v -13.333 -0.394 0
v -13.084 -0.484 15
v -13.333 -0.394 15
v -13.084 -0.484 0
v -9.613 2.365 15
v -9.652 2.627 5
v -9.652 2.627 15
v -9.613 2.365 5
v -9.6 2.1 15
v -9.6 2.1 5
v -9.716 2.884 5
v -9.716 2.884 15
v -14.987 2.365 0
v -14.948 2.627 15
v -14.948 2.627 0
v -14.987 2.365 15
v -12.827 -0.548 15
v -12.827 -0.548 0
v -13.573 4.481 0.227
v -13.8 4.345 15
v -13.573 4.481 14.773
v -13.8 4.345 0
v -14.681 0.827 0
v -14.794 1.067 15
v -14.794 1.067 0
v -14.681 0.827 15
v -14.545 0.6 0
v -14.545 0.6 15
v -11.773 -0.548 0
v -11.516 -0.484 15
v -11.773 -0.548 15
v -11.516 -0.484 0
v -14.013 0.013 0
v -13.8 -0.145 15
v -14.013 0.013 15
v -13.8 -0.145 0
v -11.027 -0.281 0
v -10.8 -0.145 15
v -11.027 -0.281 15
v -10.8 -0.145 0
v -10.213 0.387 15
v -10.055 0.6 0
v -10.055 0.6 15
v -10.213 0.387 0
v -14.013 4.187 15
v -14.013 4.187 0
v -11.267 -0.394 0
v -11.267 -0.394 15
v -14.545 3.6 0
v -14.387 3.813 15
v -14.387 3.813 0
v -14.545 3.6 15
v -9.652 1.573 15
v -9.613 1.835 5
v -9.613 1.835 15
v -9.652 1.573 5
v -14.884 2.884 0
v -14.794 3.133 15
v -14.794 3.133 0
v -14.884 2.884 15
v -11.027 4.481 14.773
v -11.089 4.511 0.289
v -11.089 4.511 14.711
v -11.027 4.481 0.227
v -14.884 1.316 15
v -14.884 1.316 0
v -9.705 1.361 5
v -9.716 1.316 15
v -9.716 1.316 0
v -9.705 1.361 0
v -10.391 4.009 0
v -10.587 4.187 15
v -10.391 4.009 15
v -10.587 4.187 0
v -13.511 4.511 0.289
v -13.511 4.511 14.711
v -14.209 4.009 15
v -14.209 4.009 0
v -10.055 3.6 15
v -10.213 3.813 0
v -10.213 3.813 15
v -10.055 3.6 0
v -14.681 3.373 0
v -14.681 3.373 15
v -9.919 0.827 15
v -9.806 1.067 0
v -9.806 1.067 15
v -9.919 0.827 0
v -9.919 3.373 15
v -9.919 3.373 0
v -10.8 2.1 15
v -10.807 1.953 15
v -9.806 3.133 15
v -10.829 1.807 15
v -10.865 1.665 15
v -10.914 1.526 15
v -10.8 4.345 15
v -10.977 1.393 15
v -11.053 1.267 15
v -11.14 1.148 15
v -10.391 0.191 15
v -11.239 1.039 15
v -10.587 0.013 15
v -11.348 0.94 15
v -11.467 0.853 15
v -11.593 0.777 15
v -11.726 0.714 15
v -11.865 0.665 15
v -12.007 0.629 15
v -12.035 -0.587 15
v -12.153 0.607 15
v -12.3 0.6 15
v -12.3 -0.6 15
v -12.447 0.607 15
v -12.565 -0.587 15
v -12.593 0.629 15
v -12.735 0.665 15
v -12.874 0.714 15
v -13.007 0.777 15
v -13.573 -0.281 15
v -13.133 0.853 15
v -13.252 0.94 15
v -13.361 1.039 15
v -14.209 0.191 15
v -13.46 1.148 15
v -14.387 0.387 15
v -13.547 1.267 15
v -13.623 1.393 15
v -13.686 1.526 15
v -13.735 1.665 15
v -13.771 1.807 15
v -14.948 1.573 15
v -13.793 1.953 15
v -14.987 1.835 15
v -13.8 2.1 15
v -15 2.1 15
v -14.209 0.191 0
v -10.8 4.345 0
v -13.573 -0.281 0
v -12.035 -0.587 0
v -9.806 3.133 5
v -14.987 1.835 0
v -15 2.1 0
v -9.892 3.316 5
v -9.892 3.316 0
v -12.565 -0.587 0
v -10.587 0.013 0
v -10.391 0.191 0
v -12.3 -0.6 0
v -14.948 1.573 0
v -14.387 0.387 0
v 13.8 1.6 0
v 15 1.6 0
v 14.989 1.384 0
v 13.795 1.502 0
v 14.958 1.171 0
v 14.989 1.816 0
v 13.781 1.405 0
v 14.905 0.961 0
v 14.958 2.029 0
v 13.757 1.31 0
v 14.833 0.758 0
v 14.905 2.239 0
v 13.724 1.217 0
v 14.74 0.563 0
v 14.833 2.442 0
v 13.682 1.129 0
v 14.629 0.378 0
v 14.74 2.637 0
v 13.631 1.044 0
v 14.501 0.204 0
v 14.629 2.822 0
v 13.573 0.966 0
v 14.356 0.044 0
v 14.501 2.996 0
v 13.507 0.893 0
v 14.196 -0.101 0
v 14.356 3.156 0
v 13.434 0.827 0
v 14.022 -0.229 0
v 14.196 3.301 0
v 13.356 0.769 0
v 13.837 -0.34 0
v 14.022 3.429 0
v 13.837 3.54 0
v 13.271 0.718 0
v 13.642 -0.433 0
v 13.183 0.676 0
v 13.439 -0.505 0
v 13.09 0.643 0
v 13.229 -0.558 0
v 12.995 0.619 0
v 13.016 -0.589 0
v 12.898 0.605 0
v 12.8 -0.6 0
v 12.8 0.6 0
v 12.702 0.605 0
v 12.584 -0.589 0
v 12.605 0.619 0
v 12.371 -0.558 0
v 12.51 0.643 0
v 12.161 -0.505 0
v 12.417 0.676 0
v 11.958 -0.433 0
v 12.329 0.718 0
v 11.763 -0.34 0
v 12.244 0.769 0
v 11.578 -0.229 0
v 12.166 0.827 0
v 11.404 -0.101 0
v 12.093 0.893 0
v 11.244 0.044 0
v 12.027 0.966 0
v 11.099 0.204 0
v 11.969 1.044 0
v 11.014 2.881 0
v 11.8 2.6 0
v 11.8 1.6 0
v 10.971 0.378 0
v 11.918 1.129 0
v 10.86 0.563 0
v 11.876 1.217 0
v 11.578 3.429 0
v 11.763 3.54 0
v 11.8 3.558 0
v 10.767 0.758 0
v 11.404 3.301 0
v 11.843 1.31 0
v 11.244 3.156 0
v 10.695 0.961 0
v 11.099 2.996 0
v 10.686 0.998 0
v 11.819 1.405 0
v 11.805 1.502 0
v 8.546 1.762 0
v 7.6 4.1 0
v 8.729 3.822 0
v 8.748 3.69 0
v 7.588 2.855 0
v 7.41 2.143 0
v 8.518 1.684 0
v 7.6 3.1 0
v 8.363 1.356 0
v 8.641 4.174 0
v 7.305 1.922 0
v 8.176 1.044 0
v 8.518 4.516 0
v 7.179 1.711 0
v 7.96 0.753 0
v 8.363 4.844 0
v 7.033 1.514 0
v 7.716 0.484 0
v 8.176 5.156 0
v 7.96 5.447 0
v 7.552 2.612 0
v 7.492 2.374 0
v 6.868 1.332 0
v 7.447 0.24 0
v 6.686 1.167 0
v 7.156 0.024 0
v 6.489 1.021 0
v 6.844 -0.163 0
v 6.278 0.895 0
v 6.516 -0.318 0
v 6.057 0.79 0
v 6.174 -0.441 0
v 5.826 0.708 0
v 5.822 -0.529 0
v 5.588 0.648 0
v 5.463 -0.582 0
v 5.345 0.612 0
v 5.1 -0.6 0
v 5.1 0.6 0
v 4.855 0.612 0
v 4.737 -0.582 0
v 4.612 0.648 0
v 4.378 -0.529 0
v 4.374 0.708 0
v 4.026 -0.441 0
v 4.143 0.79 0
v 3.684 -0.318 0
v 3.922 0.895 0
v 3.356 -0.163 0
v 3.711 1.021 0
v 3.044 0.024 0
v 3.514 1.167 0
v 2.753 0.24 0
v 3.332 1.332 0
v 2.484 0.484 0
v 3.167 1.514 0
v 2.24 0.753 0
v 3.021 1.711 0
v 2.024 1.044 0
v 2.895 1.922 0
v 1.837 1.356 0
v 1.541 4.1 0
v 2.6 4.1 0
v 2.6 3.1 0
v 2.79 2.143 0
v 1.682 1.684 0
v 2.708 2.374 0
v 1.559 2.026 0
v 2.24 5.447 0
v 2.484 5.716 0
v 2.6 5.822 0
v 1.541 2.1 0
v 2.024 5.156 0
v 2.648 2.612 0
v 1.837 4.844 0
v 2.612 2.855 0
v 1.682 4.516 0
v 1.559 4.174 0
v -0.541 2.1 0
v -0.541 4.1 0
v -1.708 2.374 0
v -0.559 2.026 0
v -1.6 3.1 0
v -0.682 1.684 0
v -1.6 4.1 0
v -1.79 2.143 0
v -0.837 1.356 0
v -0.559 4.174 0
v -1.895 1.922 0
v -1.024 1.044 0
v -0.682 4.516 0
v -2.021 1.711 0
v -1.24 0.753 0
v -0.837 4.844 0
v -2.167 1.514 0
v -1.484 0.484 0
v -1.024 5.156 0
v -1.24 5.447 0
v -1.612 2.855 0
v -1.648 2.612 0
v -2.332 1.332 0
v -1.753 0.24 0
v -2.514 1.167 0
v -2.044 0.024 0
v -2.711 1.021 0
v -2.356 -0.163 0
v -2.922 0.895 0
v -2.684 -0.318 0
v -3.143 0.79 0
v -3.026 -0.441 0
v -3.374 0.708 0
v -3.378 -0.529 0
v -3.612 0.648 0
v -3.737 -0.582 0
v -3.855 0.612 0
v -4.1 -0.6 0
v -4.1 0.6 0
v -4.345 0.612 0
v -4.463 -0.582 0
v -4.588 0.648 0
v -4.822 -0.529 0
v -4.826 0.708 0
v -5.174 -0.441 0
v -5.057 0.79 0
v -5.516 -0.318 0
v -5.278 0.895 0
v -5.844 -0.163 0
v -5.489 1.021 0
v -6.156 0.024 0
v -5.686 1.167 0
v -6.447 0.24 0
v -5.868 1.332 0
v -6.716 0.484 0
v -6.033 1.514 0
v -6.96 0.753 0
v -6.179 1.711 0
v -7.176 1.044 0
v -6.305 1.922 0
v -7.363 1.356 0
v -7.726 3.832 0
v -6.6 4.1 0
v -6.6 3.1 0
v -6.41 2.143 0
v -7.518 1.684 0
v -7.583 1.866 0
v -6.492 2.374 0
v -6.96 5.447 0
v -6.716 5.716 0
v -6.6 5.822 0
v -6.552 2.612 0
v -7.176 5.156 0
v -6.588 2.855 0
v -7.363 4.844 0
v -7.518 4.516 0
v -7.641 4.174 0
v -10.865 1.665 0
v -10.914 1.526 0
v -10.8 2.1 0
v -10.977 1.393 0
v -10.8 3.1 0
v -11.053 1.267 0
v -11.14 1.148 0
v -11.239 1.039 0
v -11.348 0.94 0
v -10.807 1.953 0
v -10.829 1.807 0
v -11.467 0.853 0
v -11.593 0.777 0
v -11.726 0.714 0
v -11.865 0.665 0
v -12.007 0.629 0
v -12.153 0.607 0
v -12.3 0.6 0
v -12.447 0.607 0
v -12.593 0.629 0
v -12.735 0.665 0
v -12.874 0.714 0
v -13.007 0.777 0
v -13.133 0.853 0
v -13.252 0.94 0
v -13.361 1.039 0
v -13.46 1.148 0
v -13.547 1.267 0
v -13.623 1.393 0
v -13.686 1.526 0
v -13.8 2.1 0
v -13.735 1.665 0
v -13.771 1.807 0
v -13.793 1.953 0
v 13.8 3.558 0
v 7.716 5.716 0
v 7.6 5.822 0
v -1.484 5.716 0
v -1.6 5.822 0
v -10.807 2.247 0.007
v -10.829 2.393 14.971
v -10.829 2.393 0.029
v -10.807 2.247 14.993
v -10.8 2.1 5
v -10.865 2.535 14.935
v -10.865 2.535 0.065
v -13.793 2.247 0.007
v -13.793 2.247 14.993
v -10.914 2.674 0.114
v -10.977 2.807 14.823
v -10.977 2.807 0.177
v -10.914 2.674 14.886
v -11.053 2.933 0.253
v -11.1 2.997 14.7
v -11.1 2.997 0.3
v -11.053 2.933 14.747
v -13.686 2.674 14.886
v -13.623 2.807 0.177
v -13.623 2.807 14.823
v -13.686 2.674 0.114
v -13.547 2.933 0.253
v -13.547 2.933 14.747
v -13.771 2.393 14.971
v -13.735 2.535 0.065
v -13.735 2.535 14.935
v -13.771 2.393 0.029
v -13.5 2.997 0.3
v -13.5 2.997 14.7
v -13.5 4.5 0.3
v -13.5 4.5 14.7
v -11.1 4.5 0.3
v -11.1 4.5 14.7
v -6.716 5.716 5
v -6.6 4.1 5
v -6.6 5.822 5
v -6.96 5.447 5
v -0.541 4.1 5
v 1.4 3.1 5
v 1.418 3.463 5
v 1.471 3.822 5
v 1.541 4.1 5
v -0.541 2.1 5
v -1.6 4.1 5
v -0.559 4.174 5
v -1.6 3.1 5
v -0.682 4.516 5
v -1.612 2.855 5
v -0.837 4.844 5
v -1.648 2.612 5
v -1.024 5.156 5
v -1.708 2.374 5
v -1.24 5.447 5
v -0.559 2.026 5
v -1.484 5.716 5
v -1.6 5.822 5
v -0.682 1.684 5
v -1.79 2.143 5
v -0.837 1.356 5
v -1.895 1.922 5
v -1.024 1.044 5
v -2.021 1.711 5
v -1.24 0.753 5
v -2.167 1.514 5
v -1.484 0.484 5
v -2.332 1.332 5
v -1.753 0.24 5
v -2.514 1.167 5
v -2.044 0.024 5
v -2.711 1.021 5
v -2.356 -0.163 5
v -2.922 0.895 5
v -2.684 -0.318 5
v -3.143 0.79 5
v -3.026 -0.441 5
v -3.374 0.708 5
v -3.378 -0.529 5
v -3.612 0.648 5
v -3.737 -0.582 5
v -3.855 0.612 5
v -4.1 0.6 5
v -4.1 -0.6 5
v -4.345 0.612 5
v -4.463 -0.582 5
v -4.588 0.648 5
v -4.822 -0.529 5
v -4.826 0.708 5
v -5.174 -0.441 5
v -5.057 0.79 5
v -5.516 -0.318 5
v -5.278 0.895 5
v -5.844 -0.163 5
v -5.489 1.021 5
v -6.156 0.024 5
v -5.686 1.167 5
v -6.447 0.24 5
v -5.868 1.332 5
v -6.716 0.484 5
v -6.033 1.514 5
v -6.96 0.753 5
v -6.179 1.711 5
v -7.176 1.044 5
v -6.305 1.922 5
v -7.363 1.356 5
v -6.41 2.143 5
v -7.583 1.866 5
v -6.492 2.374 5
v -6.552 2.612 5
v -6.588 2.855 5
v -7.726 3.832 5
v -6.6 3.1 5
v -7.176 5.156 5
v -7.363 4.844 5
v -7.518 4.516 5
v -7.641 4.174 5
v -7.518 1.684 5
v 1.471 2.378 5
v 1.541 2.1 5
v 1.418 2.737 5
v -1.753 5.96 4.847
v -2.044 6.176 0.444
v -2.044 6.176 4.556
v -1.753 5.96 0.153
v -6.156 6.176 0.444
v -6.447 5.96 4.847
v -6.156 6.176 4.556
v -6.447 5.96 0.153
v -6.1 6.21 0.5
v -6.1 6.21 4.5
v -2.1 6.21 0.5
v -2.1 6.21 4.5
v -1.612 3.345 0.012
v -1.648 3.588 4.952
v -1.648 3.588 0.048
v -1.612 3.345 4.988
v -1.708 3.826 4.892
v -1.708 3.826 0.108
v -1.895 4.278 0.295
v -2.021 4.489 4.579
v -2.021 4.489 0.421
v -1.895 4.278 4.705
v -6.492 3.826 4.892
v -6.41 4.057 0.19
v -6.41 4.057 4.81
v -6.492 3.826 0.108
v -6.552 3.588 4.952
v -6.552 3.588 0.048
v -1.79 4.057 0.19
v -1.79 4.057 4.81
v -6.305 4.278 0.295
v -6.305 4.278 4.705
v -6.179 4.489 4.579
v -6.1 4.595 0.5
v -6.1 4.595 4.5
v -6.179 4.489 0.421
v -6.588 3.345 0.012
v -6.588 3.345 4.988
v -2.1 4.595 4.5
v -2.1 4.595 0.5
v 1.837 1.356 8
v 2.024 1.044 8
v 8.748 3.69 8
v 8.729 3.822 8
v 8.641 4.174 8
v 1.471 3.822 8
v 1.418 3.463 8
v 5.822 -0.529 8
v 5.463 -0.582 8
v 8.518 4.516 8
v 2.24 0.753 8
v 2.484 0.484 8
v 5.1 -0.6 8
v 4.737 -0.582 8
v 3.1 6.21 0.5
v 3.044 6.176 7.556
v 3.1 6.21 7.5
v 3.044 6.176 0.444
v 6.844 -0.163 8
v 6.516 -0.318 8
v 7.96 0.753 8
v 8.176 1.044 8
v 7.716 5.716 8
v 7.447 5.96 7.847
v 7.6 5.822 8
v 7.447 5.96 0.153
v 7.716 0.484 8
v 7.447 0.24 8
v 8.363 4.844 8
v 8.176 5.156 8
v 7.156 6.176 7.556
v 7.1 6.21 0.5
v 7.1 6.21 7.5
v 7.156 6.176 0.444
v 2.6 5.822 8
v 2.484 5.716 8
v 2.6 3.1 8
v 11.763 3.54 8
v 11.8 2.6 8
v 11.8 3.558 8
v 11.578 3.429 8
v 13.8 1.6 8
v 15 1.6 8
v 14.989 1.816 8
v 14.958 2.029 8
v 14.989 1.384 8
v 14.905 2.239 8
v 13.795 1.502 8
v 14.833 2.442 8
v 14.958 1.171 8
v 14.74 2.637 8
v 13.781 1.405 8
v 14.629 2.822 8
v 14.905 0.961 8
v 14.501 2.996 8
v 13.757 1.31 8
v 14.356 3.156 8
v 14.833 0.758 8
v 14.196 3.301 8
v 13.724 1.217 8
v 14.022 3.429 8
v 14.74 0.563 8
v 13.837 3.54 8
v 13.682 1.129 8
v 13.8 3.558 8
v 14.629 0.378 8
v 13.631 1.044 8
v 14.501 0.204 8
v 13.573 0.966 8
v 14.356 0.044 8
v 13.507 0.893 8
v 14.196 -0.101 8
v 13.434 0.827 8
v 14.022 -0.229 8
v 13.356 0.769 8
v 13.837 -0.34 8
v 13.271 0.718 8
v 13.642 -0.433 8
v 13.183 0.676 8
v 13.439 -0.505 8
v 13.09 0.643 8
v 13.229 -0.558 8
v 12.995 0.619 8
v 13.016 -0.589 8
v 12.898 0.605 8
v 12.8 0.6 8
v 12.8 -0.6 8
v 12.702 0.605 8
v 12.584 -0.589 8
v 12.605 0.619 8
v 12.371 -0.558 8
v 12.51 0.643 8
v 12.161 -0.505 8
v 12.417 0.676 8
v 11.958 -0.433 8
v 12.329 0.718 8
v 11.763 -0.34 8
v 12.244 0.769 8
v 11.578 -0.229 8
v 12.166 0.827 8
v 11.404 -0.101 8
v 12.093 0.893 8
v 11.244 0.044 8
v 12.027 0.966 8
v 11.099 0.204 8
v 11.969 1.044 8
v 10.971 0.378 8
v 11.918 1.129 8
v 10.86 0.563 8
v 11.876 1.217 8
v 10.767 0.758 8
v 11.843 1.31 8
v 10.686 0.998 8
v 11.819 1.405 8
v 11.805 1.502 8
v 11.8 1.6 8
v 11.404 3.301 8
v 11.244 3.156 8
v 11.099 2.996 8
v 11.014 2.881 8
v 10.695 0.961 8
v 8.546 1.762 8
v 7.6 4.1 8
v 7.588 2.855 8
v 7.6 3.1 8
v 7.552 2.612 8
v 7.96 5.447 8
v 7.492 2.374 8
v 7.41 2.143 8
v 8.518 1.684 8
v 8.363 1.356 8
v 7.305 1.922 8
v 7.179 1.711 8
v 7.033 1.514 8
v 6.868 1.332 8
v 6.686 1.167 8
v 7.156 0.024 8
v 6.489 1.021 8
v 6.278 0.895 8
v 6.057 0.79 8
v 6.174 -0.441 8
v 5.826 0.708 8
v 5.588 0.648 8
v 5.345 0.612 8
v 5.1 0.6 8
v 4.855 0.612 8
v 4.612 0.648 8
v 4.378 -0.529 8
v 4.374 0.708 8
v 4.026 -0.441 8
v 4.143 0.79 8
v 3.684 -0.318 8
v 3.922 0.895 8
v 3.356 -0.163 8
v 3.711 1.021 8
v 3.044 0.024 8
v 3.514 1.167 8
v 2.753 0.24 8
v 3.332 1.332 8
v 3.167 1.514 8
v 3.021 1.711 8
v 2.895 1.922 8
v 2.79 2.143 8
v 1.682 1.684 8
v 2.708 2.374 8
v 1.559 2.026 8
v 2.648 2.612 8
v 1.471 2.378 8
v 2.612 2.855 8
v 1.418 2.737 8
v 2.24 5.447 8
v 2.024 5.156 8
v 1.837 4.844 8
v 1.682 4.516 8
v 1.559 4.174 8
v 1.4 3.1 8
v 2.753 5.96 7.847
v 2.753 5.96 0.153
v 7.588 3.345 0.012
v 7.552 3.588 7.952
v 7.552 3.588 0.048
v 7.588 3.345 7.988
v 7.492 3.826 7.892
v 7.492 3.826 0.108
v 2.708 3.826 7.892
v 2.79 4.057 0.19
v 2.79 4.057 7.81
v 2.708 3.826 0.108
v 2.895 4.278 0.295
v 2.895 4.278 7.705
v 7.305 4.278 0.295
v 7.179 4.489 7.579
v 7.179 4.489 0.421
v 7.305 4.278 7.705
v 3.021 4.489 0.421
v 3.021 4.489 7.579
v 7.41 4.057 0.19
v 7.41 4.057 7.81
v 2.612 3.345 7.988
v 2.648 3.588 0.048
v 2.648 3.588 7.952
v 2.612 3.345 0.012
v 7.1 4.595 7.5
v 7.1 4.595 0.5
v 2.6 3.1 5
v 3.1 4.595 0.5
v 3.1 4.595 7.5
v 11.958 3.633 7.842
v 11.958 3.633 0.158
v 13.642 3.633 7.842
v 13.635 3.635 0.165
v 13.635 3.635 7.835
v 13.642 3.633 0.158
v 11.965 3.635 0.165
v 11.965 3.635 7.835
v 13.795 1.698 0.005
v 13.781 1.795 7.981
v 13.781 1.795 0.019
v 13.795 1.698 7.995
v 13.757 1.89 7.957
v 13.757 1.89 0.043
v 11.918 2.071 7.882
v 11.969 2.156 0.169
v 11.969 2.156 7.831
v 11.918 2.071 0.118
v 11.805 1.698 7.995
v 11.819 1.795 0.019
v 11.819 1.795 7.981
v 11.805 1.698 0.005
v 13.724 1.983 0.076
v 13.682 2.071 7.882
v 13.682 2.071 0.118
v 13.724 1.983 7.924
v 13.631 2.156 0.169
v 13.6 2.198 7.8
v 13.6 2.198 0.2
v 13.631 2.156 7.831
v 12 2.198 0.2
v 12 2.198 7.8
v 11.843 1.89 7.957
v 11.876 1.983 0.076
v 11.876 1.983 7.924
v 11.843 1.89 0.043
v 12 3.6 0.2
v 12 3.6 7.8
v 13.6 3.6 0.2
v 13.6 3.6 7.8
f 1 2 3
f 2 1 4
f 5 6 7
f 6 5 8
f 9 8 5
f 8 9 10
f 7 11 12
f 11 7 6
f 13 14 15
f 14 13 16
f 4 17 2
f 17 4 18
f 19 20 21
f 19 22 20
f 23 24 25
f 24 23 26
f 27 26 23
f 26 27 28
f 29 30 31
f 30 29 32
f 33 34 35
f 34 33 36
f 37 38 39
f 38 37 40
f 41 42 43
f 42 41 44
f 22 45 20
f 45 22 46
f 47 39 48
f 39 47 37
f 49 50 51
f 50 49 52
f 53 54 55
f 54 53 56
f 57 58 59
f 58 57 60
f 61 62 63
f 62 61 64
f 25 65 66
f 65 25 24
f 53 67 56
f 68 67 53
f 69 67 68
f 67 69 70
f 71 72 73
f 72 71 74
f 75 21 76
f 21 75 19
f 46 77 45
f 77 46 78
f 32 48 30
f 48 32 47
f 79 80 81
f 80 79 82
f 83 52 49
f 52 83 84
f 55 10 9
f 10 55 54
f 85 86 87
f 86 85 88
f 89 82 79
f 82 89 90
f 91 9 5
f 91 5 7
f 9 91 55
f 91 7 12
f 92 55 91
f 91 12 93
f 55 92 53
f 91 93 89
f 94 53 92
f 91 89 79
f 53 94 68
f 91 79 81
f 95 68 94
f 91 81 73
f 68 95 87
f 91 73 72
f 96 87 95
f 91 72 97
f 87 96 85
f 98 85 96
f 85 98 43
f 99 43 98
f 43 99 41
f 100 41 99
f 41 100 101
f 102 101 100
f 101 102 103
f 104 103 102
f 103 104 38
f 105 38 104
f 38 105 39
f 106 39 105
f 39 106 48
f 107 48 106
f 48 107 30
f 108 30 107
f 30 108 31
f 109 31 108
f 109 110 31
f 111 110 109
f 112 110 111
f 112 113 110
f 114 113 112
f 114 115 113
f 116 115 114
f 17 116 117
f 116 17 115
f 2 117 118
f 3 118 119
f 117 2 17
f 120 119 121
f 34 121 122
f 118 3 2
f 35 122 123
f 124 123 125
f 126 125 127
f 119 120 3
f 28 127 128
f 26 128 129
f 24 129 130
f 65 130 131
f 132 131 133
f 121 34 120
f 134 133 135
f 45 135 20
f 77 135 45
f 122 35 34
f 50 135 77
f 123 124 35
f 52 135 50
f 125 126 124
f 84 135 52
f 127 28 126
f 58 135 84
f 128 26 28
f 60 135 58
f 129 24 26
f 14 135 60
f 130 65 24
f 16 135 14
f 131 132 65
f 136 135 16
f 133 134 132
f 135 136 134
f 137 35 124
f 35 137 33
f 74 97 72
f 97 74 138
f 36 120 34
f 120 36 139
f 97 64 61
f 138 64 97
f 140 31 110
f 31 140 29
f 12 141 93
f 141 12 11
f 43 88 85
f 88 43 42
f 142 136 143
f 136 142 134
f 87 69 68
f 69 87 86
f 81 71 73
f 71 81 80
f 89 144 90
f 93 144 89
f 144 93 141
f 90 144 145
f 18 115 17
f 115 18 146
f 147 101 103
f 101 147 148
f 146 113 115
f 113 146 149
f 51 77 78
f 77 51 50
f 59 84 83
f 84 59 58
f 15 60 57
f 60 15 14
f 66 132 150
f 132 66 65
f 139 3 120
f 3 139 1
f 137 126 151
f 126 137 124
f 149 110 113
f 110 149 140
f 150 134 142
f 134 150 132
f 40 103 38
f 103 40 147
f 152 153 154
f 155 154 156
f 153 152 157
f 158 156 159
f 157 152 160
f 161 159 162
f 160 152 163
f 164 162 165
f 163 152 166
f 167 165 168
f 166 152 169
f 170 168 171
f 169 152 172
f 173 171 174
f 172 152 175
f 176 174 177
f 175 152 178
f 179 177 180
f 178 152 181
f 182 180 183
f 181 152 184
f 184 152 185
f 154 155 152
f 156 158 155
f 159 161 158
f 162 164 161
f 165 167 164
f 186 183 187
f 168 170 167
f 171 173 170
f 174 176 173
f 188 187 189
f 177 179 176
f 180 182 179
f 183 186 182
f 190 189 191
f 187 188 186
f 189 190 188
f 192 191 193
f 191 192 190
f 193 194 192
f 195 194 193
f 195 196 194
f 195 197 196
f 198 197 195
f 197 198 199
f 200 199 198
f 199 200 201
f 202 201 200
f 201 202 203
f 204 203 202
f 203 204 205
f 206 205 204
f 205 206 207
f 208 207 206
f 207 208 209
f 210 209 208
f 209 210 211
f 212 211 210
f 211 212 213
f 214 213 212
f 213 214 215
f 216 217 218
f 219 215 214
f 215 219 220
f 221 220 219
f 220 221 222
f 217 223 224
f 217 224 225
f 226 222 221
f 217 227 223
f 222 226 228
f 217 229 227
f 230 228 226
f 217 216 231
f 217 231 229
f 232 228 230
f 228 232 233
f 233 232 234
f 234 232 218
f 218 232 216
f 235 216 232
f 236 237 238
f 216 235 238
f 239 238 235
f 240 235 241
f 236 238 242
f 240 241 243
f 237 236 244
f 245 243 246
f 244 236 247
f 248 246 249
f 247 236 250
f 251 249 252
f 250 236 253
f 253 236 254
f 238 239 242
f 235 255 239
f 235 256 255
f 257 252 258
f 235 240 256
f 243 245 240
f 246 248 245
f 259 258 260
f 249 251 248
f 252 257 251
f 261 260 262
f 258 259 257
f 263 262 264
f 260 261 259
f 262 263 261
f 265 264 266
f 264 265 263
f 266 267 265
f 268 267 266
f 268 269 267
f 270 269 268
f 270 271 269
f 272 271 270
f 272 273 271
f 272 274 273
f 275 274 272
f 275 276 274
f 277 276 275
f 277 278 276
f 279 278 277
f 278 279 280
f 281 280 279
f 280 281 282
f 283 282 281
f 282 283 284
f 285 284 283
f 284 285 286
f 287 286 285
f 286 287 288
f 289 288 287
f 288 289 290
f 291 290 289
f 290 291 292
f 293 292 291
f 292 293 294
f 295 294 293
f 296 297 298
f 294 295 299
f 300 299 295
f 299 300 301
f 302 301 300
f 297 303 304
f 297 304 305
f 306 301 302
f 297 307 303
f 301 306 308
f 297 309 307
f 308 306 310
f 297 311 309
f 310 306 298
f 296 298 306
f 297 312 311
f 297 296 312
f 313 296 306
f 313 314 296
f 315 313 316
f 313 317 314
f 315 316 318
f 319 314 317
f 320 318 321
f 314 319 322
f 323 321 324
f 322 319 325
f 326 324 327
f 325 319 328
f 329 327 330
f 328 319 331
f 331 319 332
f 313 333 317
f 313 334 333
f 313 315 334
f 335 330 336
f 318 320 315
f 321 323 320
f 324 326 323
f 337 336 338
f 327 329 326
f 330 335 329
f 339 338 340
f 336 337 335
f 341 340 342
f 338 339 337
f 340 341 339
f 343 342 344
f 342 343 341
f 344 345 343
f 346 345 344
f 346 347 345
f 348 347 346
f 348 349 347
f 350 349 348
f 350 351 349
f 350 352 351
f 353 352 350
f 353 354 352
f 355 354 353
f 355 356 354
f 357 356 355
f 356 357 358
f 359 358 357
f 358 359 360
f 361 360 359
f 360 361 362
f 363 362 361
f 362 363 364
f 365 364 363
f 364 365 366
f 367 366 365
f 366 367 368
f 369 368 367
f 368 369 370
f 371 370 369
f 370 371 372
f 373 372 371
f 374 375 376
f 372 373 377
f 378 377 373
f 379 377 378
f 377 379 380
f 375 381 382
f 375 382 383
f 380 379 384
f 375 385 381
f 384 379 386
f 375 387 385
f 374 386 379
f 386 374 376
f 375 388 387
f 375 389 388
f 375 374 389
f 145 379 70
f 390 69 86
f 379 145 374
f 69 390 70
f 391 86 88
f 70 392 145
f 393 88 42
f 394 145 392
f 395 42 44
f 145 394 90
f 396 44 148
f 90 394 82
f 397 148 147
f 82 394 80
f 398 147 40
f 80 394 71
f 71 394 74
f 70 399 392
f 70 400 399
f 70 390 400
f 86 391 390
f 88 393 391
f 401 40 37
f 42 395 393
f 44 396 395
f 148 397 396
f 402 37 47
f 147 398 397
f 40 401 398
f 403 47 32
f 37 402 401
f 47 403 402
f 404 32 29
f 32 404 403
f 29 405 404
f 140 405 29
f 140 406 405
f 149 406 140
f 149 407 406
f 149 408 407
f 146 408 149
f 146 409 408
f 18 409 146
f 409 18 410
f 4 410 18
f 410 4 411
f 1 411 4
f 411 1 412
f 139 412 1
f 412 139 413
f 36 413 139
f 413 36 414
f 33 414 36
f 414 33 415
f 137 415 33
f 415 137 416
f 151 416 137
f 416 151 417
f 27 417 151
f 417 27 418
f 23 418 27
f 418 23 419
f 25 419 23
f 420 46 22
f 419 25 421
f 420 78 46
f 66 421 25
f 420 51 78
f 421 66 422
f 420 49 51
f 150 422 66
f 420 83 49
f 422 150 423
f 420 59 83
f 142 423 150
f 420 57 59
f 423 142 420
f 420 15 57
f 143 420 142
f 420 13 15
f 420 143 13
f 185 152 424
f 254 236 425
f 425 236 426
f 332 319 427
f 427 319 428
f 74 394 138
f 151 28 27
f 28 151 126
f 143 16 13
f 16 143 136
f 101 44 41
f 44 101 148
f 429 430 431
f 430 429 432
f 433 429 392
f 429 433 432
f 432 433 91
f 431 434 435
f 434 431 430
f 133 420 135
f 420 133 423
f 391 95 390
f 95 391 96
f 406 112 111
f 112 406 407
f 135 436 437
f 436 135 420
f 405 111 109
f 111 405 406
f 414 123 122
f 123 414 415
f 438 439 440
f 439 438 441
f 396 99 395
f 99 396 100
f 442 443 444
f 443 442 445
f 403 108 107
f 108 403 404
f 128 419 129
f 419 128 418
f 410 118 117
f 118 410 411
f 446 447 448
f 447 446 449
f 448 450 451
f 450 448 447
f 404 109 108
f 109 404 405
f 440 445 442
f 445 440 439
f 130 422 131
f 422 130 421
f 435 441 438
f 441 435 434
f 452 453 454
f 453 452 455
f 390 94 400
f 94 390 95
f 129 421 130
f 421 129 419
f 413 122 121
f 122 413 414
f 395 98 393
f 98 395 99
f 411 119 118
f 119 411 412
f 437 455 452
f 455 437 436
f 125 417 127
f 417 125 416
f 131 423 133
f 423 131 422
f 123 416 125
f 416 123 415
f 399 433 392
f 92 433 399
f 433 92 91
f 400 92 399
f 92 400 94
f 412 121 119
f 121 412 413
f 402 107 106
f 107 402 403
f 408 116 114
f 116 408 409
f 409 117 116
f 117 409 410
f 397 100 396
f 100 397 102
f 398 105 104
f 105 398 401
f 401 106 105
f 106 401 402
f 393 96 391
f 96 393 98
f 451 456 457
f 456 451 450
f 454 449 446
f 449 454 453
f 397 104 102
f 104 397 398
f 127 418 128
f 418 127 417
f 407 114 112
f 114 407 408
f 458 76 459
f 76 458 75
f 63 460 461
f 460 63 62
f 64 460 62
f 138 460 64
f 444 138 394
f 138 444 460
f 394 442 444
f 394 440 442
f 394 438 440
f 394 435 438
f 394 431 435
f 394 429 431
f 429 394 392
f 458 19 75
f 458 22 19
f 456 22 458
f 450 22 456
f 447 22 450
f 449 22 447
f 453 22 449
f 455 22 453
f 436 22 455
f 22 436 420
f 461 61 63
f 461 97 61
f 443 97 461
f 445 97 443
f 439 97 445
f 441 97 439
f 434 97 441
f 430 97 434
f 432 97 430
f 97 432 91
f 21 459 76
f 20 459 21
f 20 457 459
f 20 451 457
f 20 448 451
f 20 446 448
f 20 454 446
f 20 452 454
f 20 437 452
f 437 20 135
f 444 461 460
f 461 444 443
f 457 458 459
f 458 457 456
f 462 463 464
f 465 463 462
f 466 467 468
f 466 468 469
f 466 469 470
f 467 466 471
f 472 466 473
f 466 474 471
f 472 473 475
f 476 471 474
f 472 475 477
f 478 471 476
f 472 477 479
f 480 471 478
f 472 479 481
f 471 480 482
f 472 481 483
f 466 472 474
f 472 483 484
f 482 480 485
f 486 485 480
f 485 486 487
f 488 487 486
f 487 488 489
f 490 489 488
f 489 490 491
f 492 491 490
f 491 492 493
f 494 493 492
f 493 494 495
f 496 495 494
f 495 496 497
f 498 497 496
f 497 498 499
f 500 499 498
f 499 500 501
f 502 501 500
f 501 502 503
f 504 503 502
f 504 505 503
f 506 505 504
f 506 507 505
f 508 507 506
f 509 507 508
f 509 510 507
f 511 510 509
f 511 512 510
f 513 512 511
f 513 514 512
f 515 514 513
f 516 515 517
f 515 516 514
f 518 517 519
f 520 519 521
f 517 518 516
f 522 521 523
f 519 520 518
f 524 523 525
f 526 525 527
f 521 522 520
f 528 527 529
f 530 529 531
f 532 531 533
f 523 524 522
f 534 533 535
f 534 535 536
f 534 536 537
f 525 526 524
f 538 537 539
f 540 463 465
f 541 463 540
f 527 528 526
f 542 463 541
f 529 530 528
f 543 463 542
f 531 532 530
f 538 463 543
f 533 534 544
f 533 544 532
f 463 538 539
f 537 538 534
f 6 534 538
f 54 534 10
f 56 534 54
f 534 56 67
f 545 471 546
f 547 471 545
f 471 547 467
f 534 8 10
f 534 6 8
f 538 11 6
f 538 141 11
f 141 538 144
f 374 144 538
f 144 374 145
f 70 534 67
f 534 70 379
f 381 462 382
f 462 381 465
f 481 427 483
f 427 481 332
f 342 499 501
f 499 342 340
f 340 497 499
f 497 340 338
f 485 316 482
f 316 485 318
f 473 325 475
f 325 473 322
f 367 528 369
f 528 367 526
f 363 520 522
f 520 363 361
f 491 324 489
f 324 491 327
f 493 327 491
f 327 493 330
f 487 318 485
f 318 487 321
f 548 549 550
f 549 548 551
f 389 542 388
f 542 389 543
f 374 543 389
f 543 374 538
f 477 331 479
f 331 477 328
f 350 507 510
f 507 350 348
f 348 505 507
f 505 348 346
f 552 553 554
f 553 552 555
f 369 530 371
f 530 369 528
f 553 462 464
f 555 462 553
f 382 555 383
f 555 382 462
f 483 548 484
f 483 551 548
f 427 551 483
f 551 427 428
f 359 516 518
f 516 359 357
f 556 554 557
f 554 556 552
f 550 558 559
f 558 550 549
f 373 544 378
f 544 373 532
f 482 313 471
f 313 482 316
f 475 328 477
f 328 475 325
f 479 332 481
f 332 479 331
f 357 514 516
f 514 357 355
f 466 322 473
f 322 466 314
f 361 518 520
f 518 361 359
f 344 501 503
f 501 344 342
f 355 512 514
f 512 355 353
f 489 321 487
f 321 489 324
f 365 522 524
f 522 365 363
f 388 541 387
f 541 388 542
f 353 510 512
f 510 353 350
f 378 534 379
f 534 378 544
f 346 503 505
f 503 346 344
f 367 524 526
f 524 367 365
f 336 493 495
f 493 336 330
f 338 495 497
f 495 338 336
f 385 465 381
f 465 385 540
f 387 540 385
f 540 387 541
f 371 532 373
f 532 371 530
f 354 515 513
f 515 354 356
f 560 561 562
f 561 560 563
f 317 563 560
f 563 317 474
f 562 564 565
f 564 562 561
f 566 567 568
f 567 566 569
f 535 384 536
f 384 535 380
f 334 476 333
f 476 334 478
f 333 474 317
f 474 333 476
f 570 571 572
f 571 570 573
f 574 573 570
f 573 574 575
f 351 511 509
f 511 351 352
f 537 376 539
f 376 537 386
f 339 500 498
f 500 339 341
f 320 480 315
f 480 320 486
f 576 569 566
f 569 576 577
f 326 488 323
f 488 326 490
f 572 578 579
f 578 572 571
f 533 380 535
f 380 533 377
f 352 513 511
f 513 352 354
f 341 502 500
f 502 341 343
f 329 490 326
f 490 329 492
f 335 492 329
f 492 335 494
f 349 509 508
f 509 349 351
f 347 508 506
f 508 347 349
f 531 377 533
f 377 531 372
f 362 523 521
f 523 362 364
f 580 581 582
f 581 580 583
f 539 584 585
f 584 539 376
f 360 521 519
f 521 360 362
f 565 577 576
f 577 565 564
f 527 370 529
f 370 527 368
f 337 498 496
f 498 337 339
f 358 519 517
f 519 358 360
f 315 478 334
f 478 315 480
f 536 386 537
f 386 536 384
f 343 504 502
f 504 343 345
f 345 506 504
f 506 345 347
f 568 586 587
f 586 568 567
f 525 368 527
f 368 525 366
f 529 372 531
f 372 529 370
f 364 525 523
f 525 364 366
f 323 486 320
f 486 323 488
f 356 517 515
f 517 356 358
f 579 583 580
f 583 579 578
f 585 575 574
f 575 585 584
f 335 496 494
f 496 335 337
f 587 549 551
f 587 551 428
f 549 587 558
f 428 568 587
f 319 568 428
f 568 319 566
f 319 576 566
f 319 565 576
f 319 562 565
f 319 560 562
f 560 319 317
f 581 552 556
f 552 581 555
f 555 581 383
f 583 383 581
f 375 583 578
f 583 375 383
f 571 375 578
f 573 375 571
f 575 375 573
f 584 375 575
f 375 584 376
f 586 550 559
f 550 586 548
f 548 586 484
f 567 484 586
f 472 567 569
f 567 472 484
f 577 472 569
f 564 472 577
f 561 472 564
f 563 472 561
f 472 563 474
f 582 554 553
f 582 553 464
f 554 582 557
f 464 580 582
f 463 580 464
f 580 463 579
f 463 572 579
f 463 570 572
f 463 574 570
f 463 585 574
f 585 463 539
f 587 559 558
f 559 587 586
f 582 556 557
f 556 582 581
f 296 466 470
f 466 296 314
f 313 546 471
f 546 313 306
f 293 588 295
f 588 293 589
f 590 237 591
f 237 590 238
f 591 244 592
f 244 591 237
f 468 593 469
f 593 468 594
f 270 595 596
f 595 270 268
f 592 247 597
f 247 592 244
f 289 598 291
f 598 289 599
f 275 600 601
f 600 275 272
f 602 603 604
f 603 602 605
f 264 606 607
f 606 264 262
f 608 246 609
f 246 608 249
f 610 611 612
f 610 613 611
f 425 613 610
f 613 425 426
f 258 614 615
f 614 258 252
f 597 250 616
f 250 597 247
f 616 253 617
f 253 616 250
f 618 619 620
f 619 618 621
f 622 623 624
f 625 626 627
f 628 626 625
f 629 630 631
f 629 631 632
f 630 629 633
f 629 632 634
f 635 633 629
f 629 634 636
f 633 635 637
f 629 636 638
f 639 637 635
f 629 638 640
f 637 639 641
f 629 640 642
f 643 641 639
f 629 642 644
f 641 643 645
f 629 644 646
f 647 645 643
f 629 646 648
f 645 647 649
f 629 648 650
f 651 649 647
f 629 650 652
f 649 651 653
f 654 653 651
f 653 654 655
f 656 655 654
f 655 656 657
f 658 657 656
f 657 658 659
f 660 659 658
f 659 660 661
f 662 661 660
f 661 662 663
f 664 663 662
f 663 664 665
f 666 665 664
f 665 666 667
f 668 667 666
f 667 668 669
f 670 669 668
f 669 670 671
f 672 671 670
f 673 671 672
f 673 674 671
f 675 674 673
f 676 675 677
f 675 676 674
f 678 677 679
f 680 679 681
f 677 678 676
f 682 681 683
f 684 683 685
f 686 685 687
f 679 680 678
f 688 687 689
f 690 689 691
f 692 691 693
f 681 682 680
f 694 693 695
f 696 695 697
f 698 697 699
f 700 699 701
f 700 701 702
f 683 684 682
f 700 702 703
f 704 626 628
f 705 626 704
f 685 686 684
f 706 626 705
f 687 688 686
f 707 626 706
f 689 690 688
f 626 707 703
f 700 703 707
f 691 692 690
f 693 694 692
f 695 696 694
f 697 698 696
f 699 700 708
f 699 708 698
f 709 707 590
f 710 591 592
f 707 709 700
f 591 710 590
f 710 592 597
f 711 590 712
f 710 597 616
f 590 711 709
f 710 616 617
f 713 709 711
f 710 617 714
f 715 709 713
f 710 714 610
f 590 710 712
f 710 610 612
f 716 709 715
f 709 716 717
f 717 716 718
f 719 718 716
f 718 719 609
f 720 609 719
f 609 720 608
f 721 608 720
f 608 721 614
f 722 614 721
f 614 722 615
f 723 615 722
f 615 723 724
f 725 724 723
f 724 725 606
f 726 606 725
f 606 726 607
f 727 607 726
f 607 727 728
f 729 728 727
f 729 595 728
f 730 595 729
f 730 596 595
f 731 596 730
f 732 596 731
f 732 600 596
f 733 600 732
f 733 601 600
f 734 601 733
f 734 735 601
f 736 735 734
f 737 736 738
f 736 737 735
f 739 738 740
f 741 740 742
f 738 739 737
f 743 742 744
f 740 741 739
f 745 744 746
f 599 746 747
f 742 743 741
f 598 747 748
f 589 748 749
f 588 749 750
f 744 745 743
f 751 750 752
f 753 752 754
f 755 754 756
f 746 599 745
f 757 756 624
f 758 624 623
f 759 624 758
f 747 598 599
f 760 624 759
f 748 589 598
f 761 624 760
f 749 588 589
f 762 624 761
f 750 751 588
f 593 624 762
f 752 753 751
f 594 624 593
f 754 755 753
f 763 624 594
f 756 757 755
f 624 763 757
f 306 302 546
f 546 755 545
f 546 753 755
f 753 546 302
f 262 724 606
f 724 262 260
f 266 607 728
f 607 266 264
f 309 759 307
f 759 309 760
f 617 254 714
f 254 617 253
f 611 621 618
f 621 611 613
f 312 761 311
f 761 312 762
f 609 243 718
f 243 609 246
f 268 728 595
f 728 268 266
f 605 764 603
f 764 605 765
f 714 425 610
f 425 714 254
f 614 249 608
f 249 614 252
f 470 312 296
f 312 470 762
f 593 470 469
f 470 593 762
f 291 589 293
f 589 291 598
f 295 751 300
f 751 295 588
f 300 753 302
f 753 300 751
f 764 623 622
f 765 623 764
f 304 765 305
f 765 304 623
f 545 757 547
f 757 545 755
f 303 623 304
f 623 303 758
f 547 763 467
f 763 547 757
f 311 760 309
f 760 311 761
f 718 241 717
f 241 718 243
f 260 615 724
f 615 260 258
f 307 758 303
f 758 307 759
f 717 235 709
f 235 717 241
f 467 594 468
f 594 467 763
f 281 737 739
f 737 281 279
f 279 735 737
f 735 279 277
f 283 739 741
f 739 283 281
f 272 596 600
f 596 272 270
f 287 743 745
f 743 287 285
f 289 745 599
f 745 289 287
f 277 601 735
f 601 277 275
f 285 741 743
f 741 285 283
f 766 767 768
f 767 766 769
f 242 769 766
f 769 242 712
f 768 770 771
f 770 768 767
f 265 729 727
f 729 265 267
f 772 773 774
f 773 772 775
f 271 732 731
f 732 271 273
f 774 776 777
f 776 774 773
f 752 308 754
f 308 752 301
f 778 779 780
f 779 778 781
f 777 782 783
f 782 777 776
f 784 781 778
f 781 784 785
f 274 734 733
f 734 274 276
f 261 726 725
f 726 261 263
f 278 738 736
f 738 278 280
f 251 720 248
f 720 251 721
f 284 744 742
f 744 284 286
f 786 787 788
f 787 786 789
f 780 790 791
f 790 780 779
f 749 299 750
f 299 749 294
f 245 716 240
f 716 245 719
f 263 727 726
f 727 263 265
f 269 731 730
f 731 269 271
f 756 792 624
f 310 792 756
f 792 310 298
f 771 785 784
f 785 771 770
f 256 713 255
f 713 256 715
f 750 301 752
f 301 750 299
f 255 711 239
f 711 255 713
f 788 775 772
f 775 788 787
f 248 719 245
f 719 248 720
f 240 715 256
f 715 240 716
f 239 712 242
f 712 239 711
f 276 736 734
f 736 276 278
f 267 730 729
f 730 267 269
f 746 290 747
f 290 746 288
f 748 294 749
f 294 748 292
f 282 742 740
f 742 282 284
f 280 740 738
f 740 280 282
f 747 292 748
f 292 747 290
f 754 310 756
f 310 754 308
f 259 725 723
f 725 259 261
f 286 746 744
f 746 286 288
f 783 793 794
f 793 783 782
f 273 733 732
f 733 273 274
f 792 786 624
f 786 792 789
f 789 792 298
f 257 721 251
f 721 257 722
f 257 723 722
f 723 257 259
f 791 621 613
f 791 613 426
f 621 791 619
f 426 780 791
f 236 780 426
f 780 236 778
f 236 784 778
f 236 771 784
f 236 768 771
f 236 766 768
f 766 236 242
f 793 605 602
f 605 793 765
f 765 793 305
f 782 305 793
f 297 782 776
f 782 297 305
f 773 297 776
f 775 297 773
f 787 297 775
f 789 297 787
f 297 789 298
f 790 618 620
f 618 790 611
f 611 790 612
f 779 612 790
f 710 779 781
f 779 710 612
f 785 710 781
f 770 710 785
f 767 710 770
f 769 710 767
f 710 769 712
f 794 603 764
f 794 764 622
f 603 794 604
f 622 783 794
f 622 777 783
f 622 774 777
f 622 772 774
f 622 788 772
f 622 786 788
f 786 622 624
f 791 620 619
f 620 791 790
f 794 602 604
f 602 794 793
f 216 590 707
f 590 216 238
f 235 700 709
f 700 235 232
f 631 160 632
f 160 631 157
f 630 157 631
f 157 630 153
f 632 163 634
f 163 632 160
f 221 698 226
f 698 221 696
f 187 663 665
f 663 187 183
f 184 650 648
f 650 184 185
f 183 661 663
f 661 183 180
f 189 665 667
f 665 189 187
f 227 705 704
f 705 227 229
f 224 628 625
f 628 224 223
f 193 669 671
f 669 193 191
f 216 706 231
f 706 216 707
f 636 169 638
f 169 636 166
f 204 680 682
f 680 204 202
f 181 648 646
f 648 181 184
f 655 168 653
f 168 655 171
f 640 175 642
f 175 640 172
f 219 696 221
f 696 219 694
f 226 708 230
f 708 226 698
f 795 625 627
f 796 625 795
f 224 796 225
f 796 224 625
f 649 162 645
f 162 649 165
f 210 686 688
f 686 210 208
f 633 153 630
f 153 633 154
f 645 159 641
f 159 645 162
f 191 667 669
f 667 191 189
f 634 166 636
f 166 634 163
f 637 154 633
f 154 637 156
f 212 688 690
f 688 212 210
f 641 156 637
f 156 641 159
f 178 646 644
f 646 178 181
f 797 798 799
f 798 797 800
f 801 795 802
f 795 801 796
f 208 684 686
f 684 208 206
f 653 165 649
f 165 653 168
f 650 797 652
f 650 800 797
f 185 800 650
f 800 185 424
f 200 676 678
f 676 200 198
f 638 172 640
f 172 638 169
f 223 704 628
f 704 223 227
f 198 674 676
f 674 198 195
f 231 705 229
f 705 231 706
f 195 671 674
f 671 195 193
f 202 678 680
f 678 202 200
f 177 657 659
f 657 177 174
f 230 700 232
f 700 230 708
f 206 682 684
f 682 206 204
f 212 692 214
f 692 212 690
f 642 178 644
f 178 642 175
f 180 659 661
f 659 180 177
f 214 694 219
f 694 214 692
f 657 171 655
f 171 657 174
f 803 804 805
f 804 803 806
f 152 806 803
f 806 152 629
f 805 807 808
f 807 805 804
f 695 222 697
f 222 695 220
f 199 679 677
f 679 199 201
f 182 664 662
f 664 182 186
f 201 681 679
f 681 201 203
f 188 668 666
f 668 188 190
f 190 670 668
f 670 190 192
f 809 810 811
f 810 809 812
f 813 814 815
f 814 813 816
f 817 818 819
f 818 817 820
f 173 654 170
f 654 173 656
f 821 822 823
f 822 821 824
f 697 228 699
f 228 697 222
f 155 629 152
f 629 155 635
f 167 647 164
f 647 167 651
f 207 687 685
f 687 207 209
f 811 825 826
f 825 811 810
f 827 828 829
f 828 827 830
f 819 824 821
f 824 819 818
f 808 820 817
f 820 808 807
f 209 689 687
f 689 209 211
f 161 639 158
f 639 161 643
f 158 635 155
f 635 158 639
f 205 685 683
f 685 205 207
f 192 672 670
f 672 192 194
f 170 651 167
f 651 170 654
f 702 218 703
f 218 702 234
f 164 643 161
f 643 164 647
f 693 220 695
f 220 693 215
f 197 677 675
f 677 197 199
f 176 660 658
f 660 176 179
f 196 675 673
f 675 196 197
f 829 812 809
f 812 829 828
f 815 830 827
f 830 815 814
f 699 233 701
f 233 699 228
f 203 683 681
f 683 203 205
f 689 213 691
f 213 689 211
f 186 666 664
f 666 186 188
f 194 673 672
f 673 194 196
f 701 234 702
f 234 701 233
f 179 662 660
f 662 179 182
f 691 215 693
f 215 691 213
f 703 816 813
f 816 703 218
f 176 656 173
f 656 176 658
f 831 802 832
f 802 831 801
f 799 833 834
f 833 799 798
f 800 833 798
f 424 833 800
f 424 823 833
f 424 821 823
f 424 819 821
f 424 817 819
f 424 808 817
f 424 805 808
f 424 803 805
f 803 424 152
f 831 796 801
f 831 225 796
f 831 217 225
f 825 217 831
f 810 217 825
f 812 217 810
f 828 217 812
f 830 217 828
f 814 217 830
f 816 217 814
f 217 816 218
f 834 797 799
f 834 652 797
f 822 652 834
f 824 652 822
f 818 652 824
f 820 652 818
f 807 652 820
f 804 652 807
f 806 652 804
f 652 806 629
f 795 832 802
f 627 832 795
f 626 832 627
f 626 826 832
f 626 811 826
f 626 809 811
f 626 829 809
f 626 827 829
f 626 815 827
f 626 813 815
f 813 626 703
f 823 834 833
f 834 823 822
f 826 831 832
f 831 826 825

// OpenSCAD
include <../utp-cable-organizer.scad>

// Example C2: Advanced usage - webbing
settings_cables_dia = [[3,5,5,2]];

settings_height = [[15,5]];
settings_flat_back = false;
settings_flat_front = false;
settings_uniform_width = false;

settings_cable_spacing = [3];
settings_cable_spacing_length = "c";
settings_webbing_wall_thickness = 2;
